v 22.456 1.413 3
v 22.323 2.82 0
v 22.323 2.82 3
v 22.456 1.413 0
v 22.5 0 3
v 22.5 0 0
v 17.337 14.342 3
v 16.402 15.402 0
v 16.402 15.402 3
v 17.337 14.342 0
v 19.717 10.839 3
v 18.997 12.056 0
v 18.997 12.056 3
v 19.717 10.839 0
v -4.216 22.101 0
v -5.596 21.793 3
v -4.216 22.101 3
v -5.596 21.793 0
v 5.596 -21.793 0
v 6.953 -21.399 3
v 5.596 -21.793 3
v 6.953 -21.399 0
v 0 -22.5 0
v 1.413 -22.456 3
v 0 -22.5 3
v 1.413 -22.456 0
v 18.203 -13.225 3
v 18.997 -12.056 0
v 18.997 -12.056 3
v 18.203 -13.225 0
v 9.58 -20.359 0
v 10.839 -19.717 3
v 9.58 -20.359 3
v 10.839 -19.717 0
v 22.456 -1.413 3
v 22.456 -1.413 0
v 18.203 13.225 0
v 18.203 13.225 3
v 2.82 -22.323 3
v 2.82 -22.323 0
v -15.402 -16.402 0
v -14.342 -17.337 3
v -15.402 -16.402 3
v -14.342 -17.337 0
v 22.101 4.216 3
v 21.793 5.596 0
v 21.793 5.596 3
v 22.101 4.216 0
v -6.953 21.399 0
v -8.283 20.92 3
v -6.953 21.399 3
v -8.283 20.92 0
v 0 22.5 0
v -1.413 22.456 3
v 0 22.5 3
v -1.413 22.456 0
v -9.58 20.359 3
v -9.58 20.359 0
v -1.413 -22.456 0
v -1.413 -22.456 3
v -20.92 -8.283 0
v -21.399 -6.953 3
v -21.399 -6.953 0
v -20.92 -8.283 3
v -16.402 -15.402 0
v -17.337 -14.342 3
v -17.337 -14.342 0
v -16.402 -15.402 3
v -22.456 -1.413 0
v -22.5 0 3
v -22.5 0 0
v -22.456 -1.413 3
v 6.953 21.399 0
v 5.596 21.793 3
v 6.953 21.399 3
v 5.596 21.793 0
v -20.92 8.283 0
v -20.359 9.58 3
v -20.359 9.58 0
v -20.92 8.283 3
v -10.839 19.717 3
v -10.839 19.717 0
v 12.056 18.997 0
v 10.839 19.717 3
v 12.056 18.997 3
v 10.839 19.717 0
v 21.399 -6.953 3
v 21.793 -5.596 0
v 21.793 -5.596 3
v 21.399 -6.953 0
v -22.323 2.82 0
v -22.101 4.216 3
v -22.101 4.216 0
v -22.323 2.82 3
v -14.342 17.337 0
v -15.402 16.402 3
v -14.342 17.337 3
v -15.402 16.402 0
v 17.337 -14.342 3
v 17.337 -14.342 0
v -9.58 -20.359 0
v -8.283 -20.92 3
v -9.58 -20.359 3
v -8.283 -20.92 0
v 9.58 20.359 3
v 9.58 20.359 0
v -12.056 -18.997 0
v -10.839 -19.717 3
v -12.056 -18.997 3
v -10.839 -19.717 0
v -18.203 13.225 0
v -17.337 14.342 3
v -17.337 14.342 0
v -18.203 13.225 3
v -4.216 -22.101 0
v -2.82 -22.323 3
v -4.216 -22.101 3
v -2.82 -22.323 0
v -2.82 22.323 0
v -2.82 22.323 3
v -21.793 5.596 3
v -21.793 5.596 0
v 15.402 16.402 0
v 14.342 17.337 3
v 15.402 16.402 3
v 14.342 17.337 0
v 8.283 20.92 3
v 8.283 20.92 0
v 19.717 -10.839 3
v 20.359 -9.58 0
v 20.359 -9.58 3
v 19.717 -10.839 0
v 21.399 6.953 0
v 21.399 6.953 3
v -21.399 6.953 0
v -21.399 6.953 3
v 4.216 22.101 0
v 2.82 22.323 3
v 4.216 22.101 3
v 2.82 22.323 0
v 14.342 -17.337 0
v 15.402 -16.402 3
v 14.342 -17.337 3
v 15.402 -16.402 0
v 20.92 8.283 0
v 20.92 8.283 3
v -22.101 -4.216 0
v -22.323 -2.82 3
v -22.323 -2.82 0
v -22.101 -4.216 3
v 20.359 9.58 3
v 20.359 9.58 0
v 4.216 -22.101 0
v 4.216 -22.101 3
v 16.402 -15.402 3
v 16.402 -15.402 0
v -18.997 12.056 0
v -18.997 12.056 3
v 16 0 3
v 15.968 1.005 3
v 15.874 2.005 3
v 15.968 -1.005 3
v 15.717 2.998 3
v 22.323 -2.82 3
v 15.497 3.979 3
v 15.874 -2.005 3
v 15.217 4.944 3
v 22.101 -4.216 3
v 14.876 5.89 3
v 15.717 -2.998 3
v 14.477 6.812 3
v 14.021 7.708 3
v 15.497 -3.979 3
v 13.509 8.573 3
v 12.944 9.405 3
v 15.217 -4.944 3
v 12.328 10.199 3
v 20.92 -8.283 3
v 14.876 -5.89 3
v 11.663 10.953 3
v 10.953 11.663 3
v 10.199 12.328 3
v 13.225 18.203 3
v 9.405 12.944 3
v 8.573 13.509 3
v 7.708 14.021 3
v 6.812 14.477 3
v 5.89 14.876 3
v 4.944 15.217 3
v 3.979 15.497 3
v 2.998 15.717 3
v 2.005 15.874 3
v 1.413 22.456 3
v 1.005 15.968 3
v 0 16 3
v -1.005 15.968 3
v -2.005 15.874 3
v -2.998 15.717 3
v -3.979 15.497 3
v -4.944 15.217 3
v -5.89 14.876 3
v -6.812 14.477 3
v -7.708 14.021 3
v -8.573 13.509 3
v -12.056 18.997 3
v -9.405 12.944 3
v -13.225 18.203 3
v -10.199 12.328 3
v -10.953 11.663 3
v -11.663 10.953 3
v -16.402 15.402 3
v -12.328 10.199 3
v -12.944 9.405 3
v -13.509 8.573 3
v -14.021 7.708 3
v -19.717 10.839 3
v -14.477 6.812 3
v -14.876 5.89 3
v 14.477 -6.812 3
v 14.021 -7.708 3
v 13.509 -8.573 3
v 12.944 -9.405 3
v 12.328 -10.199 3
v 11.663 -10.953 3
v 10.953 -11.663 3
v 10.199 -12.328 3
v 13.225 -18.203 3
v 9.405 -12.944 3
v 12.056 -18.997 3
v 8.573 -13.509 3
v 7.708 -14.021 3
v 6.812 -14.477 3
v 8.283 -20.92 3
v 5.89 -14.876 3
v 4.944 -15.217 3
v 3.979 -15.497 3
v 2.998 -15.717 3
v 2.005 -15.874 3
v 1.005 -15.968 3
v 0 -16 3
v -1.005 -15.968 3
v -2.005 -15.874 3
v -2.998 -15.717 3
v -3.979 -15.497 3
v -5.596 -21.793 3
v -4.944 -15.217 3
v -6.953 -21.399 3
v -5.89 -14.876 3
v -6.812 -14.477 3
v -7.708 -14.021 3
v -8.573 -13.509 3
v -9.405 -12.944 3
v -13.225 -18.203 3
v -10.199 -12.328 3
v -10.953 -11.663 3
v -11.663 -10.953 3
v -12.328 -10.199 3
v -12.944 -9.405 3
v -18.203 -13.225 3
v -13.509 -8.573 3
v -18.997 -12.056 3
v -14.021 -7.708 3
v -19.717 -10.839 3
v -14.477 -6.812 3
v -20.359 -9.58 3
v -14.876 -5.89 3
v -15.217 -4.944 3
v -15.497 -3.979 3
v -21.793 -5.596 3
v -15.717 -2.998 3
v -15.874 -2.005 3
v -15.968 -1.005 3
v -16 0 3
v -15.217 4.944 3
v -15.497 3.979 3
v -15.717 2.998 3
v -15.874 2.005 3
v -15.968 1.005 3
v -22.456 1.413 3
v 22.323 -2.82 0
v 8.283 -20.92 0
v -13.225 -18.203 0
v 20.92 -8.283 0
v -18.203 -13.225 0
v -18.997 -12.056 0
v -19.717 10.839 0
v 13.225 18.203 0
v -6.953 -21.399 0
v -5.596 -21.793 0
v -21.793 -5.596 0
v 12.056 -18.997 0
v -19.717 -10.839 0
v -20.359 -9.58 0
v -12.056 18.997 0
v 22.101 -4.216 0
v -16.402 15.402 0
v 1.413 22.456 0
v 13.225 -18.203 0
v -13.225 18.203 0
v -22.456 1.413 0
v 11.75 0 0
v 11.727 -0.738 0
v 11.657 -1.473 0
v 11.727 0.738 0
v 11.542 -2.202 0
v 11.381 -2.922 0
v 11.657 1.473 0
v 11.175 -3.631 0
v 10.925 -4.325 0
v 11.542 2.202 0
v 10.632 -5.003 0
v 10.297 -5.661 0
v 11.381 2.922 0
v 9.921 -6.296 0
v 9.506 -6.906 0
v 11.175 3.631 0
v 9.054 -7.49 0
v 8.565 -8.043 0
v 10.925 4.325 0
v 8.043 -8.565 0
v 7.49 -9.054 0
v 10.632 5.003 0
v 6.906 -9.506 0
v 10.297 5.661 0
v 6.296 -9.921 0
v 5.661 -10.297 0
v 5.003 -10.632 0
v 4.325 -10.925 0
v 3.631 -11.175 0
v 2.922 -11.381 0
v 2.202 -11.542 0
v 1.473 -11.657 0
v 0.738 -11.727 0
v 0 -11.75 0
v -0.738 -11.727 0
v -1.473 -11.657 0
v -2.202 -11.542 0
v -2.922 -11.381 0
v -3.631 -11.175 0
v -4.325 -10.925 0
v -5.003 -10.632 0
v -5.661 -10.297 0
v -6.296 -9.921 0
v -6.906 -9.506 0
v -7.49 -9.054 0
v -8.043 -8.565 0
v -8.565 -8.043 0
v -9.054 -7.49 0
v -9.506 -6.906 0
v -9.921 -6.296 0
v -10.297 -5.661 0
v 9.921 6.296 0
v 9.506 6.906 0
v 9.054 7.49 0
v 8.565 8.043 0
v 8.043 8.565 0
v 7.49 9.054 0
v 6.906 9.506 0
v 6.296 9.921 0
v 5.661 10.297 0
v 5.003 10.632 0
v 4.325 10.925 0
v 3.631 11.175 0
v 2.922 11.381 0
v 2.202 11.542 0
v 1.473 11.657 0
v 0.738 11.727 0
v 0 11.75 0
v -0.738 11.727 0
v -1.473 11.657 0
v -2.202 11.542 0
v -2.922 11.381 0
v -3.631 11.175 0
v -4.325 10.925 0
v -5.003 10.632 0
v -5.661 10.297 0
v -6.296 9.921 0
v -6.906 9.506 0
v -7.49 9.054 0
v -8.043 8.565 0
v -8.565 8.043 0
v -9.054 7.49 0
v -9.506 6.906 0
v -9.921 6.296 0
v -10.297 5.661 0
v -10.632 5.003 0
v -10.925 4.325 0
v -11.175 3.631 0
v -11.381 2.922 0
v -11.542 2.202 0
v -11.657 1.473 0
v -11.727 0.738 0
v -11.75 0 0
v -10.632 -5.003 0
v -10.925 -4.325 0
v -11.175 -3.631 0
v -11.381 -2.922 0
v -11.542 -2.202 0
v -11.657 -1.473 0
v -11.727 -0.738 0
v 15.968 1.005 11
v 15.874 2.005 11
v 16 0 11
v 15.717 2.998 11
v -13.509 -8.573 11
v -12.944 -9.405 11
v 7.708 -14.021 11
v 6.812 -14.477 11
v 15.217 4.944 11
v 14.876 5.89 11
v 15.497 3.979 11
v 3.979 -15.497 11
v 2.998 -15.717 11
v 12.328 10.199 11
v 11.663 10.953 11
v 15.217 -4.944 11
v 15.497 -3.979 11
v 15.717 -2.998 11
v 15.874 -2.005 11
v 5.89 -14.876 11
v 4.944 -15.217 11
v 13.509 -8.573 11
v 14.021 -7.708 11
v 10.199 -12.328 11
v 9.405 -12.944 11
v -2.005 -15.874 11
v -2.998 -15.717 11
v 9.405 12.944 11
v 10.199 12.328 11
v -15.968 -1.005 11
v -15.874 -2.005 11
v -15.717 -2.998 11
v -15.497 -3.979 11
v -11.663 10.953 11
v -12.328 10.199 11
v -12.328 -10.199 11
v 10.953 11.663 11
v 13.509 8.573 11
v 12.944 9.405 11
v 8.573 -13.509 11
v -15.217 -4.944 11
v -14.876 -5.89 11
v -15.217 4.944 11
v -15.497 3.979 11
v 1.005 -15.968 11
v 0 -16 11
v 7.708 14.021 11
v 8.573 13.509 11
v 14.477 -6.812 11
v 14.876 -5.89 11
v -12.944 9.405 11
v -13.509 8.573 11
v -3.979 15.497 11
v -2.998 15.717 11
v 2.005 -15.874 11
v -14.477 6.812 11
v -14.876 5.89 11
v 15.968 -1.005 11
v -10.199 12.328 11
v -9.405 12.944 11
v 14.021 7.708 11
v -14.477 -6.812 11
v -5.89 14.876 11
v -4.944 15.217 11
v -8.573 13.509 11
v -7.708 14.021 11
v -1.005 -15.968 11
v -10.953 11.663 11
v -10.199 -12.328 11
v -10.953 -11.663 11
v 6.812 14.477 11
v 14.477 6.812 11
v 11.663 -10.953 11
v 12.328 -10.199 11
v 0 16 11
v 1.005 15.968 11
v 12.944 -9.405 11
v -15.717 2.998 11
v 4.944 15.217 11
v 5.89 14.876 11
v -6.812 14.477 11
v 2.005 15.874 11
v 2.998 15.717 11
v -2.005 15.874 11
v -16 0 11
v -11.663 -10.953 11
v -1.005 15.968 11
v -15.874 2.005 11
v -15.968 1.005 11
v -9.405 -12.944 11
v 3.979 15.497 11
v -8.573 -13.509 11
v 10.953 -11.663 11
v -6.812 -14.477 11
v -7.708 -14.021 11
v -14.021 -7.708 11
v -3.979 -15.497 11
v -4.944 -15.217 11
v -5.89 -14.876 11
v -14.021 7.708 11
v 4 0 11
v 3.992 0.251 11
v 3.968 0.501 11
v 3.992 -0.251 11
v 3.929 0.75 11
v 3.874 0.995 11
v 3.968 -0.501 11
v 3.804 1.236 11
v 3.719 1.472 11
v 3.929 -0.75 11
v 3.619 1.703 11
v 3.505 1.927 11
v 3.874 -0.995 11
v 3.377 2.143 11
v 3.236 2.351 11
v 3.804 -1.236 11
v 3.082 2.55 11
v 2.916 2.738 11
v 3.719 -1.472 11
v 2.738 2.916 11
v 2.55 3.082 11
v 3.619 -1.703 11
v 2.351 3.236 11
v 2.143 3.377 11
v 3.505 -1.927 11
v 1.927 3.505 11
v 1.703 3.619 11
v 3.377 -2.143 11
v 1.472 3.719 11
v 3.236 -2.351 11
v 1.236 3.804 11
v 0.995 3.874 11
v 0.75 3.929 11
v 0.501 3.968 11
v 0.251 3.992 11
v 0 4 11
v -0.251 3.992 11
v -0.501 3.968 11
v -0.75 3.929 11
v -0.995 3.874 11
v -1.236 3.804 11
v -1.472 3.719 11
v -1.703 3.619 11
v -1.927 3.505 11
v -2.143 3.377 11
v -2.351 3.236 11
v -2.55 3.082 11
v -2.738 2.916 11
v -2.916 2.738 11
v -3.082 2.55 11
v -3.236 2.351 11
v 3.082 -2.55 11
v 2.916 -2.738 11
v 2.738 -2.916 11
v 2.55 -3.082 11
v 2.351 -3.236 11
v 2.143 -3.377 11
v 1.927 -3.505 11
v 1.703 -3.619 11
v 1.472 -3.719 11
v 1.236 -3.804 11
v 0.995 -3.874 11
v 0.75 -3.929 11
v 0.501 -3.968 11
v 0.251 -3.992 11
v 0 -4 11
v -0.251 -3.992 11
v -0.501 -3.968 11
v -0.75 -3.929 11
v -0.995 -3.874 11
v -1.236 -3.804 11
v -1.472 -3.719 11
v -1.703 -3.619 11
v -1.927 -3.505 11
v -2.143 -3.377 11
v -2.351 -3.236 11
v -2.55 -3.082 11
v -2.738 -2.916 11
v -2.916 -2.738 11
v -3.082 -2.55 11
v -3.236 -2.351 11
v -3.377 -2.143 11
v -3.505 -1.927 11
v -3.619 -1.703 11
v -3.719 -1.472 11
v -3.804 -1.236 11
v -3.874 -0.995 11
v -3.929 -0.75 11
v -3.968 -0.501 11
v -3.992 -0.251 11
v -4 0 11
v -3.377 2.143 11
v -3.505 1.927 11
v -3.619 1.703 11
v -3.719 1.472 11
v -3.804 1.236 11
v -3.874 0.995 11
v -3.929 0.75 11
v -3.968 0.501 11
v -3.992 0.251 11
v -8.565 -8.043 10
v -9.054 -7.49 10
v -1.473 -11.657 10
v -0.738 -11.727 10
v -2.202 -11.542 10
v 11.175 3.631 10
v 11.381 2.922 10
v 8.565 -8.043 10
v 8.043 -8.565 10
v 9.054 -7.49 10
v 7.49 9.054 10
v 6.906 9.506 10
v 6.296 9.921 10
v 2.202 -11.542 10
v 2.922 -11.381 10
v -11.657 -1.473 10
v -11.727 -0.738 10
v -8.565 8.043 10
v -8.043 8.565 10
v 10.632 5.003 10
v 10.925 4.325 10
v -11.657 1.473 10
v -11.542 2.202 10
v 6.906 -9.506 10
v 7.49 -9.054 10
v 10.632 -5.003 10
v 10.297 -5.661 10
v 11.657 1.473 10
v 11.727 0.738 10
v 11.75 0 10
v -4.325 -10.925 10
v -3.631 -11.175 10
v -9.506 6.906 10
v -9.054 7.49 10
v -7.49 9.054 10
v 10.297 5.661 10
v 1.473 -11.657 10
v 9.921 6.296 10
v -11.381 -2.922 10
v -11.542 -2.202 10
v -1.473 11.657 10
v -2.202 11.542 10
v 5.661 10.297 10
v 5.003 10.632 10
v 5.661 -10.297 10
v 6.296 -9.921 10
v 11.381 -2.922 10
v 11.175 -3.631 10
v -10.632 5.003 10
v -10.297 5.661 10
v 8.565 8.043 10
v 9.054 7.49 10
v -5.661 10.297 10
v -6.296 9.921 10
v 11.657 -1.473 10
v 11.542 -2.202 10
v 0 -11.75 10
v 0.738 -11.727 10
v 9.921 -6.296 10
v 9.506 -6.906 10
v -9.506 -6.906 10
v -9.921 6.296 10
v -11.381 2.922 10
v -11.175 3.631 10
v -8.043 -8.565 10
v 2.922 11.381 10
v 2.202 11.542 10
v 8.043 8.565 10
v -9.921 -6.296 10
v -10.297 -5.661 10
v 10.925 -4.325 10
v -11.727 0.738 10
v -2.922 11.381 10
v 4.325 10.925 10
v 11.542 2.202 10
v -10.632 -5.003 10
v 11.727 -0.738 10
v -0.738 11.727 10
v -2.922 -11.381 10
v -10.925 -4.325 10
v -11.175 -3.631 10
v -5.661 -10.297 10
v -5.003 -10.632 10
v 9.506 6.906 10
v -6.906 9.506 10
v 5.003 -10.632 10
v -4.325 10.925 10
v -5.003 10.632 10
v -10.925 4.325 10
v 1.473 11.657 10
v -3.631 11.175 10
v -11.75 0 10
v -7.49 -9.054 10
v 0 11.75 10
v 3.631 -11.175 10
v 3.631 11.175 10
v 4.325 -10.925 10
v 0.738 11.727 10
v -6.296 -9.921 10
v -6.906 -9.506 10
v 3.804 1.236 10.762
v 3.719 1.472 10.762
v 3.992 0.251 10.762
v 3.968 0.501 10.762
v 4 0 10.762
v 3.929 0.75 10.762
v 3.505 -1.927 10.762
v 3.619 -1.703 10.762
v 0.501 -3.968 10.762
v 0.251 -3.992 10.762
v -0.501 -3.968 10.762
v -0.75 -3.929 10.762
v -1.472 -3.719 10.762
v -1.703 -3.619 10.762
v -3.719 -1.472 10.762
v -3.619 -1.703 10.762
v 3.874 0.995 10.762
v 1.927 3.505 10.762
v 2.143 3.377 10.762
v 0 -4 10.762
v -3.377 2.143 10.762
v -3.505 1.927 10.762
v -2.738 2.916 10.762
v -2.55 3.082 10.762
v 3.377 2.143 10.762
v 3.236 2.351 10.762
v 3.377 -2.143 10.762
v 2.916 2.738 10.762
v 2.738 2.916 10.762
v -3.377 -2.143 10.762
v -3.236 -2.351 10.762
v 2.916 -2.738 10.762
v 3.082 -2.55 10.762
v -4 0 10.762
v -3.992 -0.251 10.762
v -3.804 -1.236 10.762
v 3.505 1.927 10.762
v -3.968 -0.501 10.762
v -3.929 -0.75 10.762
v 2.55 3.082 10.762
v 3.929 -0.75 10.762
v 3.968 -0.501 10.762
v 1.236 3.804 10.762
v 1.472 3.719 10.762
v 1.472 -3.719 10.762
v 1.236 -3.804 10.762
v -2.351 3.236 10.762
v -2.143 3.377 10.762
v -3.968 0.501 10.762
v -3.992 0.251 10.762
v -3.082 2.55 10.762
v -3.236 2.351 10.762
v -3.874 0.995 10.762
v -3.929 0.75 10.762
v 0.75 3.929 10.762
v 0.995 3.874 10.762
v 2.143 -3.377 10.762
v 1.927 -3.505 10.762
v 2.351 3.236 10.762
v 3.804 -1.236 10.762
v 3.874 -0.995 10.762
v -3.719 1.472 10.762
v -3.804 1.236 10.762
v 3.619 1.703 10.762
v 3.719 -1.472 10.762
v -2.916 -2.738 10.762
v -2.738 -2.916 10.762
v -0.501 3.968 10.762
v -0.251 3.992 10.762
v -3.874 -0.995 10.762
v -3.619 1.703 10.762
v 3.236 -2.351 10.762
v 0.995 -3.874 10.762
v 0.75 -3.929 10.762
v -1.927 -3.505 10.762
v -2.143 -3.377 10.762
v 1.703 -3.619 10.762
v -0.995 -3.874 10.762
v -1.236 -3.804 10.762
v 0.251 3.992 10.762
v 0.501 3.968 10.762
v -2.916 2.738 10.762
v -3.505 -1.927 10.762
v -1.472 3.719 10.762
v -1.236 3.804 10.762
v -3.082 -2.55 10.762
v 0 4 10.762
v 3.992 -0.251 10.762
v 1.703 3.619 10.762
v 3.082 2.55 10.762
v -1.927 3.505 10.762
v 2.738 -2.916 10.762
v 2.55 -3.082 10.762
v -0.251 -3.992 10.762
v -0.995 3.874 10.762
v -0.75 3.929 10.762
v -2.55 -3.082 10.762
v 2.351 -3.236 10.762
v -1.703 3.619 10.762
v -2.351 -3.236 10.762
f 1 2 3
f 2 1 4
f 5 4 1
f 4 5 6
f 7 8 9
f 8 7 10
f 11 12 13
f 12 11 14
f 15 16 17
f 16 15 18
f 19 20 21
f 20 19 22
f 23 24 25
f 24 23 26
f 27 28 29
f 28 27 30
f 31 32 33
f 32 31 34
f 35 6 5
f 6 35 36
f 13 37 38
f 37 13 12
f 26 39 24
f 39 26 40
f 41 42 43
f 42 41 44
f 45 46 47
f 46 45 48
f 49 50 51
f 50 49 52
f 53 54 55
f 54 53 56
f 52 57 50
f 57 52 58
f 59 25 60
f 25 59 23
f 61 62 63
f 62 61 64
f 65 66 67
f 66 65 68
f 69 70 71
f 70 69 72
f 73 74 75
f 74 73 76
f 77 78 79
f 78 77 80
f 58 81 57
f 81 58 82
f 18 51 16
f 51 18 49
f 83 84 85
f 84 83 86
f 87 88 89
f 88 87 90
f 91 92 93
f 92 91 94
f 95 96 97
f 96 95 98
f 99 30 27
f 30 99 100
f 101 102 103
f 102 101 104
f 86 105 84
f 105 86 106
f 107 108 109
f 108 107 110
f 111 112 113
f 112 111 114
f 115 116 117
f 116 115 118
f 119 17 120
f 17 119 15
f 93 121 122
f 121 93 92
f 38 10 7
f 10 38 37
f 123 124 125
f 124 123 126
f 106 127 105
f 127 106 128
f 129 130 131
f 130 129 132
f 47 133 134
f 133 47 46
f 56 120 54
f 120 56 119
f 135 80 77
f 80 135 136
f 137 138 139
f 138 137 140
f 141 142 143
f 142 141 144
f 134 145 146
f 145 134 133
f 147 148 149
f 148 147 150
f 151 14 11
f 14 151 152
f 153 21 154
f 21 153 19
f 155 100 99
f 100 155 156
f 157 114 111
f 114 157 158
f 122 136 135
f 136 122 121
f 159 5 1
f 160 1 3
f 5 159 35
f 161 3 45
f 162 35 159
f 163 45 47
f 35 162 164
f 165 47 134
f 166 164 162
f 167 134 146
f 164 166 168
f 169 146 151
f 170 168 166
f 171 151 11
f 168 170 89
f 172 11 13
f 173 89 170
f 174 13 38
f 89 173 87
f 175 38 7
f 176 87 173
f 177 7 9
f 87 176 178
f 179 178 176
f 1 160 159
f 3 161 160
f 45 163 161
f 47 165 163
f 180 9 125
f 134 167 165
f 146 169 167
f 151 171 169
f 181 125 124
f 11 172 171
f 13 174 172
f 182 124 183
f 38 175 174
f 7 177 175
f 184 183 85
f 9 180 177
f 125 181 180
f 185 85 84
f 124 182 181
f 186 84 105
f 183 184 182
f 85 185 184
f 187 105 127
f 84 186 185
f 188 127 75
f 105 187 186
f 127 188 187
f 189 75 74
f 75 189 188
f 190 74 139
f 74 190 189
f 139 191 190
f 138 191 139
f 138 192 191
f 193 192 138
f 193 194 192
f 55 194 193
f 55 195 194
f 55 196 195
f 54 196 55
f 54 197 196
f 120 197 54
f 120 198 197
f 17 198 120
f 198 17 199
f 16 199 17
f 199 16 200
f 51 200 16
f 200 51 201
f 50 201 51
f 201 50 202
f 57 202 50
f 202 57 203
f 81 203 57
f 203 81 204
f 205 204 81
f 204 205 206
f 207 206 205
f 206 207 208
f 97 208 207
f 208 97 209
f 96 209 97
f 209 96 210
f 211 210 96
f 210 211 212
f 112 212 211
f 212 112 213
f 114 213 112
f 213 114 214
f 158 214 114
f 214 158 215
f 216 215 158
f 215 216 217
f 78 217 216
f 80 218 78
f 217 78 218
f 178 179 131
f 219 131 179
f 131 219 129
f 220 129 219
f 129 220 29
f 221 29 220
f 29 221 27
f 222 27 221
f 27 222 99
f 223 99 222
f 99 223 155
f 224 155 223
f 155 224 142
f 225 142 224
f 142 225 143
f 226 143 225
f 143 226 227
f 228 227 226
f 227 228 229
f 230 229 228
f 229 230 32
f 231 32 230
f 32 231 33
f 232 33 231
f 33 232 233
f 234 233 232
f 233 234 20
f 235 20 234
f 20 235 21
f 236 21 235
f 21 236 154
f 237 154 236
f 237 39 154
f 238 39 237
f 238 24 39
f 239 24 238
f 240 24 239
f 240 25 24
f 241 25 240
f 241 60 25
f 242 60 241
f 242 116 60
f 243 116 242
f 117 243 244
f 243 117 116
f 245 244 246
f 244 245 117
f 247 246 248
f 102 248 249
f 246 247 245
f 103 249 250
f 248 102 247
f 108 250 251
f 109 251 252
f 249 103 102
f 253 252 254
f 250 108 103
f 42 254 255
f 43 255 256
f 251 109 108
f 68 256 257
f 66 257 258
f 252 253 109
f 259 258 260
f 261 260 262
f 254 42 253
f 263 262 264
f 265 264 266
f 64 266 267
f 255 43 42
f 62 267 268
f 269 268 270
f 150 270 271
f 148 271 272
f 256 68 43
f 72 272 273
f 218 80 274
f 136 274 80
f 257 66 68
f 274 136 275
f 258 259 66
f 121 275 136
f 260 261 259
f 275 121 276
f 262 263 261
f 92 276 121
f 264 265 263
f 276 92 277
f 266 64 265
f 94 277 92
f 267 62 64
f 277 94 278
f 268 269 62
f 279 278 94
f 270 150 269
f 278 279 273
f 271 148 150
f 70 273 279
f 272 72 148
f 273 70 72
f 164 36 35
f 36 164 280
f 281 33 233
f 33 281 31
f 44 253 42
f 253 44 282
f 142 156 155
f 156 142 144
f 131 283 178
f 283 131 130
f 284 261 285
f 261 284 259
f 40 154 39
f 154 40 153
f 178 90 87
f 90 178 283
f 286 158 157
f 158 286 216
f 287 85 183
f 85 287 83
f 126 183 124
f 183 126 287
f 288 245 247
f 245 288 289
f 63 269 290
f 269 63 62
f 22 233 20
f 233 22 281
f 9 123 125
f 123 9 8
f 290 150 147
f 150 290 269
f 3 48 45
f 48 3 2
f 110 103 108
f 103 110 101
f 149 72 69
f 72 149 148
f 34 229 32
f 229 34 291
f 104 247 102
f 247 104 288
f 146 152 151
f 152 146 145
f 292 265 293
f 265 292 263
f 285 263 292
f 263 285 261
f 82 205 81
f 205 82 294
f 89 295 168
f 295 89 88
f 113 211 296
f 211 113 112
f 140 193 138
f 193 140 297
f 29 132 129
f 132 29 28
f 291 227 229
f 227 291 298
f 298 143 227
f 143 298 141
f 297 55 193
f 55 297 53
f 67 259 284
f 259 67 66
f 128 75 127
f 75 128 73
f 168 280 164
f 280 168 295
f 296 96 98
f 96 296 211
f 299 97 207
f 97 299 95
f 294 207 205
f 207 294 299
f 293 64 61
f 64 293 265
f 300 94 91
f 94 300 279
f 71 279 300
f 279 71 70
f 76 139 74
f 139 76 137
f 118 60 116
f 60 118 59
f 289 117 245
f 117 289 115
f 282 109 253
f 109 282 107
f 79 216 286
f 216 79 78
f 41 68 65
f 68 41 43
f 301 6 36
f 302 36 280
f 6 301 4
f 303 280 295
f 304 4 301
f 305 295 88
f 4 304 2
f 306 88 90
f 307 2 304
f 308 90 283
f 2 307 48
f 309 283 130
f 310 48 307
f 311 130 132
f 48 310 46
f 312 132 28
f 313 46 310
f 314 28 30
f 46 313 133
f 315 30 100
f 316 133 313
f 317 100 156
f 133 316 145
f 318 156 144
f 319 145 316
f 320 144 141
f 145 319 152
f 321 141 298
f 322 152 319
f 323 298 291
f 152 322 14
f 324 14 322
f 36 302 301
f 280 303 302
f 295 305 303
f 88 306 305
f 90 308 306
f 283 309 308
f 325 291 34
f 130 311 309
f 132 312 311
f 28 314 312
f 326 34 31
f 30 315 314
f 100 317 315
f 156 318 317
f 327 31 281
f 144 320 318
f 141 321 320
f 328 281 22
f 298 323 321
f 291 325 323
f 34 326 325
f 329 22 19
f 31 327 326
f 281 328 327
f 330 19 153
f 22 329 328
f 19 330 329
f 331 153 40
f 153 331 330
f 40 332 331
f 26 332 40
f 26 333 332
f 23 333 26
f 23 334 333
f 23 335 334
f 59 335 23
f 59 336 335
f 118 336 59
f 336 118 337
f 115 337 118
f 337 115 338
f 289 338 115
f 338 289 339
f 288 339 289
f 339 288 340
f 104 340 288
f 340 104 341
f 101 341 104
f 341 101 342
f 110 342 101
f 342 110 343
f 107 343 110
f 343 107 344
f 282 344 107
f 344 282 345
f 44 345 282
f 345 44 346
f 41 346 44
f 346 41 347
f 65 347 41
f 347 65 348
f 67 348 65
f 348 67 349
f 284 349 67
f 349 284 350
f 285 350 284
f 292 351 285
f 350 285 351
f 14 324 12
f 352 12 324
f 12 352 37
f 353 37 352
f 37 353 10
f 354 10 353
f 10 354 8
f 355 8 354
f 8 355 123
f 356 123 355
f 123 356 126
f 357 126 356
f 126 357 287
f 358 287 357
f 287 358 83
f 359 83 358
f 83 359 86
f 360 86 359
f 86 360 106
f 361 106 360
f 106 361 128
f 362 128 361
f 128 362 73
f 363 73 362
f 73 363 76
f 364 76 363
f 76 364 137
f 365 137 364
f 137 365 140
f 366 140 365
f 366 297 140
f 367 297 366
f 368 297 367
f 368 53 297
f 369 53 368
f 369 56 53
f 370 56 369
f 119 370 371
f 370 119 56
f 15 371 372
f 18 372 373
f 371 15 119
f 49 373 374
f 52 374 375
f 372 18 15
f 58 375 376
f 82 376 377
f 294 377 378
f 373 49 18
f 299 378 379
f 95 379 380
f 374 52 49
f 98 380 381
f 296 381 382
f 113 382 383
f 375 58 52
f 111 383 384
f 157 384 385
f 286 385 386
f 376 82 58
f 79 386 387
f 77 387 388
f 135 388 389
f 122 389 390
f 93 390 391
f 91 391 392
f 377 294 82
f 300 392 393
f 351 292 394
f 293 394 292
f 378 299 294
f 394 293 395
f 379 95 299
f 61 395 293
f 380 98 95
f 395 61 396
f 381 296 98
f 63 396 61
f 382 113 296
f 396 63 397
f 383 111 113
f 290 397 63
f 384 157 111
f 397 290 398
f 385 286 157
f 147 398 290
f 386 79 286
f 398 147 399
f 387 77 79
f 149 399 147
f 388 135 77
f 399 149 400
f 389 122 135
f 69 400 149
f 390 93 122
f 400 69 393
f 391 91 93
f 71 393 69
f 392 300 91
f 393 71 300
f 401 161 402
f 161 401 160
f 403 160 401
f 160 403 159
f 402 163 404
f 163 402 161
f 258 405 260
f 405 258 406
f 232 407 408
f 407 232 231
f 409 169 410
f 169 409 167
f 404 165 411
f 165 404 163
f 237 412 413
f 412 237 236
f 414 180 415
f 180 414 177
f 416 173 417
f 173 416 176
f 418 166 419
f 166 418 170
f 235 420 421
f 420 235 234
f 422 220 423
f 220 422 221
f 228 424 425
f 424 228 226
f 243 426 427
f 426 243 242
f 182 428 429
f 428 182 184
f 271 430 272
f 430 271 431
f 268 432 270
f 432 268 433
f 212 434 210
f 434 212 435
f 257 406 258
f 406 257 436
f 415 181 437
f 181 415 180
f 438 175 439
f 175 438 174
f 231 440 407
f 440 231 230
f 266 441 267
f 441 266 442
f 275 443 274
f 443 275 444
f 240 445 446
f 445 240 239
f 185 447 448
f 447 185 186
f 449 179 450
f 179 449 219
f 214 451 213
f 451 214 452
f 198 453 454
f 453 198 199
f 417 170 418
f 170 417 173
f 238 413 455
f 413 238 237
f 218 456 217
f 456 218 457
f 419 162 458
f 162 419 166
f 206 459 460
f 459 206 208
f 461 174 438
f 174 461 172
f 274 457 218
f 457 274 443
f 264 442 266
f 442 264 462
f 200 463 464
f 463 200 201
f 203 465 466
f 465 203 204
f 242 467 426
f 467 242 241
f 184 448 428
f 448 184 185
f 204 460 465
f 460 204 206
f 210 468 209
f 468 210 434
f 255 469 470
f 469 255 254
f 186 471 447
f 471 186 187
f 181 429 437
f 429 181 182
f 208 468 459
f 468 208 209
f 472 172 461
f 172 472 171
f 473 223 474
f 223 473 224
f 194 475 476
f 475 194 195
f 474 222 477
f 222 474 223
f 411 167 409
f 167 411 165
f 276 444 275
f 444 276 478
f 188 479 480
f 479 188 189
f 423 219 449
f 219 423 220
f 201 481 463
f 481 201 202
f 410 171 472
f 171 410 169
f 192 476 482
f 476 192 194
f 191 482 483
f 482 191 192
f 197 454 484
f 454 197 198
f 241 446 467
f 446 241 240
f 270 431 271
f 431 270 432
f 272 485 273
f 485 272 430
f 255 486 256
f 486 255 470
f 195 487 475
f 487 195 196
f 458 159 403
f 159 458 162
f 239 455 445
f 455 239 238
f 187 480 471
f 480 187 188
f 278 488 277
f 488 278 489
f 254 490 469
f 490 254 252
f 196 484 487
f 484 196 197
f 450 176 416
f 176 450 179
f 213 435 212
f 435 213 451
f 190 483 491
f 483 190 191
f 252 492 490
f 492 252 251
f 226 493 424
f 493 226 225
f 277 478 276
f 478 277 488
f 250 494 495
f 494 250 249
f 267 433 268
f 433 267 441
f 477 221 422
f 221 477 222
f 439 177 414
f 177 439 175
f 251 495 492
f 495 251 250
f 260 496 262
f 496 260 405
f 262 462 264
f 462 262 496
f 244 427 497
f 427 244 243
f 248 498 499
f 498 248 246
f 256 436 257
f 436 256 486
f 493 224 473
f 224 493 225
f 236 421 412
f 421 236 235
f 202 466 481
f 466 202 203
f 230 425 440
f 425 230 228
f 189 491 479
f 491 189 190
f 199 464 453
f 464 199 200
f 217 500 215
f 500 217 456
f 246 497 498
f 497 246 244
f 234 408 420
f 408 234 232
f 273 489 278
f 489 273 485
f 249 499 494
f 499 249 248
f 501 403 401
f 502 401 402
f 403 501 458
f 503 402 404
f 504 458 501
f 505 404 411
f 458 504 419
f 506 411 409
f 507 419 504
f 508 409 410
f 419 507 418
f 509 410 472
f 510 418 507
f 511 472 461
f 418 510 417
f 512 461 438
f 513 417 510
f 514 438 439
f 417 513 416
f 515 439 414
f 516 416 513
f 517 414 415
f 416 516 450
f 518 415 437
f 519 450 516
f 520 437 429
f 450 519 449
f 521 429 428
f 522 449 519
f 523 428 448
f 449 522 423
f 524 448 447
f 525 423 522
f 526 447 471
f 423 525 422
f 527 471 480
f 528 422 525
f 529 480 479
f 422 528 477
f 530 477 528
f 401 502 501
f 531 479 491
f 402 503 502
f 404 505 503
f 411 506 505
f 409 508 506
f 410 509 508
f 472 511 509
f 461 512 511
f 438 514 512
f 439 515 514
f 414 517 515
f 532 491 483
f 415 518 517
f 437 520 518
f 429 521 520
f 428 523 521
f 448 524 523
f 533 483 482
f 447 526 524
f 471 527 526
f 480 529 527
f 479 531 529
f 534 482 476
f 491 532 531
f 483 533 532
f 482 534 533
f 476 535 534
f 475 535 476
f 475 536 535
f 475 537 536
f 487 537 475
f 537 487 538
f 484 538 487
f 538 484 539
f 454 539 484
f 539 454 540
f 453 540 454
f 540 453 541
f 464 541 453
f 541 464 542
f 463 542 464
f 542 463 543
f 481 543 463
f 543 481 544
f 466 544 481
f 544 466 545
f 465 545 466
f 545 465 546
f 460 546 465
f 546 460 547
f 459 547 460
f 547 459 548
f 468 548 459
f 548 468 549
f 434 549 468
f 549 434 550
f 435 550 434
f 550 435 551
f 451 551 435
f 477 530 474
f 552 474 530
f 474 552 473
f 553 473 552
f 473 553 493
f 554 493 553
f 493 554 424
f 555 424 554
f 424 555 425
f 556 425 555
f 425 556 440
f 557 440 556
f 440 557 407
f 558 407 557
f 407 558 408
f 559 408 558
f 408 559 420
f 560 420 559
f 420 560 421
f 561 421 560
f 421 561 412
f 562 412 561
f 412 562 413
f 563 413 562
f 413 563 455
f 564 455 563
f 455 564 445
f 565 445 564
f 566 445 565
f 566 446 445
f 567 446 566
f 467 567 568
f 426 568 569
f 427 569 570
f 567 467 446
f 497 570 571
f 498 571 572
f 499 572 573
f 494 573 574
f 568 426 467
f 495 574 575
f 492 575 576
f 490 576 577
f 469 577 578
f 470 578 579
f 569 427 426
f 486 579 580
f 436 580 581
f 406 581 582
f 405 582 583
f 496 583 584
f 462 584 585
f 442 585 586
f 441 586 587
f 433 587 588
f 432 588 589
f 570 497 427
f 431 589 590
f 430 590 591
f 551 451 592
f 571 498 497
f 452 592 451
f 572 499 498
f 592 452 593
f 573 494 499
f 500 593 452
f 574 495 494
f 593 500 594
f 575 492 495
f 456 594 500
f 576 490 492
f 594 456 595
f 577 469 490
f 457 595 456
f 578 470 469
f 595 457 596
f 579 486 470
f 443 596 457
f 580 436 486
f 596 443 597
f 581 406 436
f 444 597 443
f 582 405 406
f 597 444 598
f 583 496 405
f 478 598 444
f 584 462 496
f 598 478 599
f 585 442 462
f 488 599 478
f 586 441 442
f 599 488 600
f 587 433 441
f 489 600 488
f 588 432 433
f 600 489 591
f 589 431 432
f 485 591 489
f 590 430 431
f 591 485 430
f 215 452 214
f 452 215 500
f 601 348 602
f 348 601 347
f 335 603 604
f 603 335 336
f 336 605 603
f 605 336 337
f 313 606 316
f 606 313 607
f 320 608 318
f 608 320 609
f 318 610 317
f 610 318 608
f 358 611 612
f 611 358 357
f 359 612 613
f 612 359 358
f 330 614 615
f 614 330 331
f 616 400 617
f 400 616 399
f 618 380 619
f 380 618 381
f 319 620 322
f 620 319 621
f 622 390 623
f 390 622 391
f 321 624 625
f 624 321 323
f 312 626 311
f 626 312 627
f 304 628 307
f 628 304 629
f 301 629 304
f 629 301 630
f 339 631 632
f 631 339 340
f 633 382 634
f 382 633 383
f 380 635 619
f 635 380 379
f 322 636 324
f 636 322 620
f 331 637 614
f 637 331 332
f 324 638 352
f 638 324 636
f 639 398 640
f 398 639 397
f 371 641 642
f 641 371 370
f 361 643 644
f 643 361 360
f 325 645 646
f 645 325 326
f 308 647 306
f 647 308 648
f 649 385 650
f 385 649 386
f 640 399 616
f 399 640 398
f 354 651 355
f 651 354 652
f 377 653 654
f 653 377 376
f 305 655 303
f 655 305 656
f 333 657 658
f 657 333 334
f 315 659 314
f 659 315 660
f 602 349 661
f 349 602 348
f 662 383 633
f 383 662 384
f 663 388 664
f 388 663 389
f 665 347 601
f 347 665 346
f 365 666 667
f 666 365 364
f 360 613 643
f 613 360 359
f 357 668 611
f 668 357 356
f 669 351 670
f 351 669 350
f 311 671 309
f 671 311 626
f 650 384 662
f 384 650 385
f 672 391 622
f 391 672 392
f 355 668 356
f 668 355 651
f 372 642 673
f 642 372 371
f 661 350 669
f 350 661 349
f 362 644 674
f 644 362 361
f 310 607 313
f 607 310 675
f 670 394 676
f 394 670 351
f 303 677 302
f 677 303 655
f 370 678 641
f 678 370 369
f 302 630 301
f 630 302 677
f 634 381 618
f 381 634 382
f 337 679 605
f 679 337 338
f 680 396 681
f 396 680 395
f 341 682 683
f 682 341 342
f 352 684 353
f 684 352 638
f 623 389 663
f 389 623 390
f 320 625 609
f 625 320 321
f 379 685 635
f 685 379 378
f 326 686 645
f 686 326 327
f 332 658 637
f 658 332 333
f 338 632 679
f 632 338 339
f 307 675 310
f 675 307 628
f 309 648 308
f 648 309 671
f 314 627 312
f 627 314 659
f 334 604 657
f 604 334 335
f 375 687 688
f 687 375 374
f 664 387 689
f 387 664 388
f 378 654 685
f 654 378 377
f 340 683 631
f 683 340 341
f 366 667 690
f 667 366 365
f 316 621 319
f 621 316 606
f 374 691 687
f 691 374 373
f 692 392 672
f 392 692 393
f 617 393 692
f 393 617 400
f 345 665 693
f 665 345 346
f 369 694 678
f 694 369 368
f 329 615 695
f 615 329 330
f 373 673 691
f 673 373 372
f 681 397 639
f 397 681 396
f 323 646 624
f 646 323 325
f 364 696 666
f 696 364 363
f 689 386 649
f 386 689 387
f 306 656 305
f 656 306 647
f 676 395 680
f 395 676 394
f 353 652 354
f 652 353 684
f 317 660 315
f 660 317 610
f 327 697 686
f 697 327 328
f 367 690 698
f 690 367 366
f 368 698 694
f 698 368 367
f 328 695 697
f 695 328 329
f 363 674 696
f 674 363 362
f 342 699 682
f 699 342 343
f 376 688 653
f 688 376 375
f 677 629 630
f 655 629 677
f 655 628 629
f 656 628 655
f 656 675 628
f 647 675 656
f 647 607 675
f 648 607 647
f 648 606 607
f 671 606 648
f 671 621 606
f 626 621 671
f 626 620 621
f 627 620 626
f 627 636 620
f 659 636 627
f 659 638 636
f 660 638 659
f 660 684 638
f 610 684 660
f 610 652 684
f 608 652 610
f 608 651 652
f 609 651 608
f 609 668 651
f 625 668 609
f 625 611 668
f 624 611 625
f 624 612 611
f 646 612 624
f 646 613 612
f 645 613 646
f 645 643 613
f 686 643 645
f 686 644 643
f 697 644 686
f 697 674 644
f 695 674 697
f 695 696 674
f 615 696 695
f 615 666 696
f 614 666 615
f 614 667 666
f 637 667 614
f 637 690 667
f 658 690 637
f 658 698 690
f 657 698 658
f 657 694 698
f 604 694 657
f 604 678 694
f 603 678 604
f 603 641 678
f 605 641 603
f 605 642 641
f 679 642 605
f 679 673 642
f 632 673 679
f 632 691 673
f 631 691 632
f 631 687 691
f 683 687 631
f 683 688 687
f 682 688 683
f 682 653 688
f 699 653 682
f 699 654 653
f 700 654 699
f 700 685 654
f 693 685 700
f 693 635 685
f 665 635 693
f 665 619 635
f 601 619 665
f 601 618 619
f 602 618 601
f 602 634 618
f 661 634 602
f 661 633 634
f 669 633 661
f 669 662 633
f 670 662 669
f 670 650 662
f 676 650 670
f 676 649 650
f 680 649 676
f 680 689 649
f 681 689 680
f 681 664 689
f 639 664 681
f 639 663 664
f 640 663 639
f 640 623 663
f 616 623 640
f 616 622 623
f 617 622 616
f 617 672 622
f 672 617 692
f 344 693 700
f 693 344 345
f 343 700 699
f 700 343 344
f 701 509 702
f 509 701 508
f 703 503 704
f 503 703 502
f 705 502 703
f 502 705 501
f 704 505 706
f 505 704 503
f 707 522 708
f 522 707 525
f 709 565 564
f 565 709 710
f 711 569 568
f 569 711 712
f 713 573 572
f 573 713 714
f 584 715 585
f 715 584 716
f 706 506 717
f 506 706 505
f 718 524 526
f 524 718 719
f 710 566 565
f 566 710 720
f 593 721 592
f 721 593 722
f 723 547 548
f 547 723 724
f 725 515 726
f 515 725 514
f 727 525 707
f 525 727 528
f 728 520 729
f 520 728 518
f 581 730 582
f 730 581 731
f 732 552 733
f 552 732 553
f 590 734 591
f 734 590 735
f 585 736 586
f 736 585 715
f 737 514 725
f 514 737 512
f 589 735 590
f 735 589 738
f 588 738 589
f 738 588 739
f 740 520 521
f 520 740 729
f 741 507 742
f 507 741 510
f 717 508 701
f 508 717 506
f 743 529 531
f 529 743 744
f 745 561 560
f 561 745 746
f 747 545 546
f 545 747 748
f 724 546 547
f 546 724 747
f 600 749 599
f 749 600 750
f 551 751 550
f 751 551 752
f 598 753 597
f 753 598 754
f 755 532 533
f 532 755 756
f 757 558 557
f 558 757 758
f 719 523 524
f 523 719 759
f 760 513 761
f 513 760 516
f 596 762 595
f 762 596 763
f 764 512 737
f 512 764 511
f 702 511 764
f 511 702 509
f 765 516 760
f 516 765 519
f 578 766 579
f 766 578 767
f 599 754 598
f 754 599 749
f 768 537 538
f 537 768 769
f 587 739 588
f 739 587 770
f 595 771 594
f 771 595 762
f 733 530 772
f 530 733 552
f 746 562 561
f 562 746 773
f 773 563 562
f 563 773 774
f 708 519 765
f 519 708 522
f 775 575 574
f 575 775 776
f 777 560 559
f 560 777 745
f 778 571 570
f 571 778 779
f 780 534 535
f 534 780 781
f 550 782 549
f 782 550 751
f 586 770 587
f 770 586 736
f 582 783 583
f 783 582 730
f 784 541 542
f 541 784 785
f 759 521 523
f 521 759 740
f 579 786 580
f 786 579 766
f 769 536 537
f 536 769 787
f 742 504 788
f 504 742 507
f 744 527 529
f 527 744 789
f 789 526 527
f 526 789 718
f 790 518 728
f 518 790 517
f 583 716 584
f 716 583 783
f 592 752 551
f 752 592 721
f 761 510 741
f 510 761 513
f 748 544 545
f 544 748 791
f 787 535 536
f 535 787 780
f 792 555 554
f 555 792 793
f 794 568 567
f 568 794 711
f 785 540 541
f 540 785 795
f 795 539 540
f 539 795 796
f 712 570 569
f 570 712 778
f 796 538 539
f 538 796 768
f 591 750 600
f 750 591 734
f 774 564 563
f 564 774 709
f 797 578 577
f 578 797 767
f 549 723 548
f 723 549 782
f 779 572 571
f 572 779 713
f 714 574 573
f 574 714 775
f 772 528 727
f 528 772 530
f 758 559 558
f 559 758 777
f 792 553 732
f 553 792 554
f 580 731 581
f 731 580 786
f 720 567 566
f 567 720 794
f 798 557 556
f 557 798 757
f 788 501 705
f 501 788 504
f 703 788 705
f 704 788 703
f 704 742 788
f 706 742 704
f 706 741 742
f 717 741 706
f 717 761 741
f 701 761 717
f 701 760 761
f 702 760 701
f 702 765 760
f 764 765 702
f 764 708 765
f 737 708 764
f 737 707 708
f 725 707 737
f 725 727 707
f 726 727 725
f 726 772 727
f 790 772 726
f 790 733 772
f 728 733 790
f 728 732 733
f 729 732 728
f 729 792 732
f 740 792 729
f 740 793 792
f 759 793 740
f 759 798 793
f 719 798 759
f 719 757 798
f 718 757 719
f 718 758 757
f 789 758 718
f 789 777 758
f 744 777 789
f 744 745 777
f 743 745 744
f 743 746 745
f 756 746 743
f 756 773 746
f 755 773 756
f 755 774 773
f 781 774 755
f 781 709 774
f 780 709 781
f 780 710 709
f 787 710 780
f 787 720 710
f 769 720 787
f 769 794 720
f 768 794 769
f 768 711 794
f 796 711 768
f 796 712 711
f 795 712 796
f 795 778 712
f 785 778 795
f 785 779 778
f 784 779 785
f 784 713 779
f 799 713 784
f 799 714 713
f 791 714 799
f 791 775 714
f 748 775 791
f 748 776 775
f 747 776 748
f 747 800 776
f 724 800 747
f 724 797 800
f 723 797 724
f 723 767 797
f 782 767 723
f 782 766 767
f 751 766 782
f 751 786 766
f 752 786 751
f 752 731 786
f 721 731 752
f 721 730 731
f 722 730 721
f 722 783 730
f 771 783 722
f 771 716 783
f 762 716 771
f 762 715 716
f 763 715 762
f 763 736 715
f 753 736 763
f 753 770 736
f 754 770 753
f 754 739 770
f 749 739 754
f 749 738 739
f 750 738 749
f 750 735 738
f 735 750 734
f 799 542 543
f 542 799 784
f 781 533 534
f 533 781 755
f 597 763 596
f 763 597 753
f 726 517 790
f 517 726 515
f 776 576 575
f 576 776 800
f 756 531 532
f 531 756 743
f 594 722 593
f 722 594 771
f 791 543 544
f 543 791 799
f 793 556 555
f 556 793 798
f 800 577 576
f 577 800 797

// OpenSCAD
/* spindle bearing adapter for Filament spools
	 by Kevin Osborn 
*/
// dimensions in mm
// How far into the spindle you want the hub
Spindle_length = 8;
// The size of your hole
Spindle_diameter = 32;
// Diameter of your axel/threaded rod
Axel_diameter = 8;
// Thickness in mm of the brim
Brim_height = 3;
// Width of the brim outside the spindle
Brim_width =13;//[0:50]
/* [Advanced] */
Layer_height = .254;
skate_recess_height = 10;
inner_wall_thick = Layer_height *3;
/* [Hidden] */
Brim_diameter = Spindle_diameter+Brim_width;
$fn=100;

difference()
{
  union()// the outside hat
   {
   cylinder(Brim_height,Brim_diameter/2,Brim_diameter/2);	
   translate ([0,0,Brim_height]) cylinder (Spindle_length,Spindle_diameter/2,Spindle_diameter/2);//Spindle part
	
   }
   union()
    {
    cylinder(skate_recess_height,11.75,11.75); // skate bearing recess
    translate([0,0,skate_recess_height +inner_wall_thick]) cylinder(Spindle_length+Brim_height,Axel_diameter/2,Axel_diameter/2);
    }

}


